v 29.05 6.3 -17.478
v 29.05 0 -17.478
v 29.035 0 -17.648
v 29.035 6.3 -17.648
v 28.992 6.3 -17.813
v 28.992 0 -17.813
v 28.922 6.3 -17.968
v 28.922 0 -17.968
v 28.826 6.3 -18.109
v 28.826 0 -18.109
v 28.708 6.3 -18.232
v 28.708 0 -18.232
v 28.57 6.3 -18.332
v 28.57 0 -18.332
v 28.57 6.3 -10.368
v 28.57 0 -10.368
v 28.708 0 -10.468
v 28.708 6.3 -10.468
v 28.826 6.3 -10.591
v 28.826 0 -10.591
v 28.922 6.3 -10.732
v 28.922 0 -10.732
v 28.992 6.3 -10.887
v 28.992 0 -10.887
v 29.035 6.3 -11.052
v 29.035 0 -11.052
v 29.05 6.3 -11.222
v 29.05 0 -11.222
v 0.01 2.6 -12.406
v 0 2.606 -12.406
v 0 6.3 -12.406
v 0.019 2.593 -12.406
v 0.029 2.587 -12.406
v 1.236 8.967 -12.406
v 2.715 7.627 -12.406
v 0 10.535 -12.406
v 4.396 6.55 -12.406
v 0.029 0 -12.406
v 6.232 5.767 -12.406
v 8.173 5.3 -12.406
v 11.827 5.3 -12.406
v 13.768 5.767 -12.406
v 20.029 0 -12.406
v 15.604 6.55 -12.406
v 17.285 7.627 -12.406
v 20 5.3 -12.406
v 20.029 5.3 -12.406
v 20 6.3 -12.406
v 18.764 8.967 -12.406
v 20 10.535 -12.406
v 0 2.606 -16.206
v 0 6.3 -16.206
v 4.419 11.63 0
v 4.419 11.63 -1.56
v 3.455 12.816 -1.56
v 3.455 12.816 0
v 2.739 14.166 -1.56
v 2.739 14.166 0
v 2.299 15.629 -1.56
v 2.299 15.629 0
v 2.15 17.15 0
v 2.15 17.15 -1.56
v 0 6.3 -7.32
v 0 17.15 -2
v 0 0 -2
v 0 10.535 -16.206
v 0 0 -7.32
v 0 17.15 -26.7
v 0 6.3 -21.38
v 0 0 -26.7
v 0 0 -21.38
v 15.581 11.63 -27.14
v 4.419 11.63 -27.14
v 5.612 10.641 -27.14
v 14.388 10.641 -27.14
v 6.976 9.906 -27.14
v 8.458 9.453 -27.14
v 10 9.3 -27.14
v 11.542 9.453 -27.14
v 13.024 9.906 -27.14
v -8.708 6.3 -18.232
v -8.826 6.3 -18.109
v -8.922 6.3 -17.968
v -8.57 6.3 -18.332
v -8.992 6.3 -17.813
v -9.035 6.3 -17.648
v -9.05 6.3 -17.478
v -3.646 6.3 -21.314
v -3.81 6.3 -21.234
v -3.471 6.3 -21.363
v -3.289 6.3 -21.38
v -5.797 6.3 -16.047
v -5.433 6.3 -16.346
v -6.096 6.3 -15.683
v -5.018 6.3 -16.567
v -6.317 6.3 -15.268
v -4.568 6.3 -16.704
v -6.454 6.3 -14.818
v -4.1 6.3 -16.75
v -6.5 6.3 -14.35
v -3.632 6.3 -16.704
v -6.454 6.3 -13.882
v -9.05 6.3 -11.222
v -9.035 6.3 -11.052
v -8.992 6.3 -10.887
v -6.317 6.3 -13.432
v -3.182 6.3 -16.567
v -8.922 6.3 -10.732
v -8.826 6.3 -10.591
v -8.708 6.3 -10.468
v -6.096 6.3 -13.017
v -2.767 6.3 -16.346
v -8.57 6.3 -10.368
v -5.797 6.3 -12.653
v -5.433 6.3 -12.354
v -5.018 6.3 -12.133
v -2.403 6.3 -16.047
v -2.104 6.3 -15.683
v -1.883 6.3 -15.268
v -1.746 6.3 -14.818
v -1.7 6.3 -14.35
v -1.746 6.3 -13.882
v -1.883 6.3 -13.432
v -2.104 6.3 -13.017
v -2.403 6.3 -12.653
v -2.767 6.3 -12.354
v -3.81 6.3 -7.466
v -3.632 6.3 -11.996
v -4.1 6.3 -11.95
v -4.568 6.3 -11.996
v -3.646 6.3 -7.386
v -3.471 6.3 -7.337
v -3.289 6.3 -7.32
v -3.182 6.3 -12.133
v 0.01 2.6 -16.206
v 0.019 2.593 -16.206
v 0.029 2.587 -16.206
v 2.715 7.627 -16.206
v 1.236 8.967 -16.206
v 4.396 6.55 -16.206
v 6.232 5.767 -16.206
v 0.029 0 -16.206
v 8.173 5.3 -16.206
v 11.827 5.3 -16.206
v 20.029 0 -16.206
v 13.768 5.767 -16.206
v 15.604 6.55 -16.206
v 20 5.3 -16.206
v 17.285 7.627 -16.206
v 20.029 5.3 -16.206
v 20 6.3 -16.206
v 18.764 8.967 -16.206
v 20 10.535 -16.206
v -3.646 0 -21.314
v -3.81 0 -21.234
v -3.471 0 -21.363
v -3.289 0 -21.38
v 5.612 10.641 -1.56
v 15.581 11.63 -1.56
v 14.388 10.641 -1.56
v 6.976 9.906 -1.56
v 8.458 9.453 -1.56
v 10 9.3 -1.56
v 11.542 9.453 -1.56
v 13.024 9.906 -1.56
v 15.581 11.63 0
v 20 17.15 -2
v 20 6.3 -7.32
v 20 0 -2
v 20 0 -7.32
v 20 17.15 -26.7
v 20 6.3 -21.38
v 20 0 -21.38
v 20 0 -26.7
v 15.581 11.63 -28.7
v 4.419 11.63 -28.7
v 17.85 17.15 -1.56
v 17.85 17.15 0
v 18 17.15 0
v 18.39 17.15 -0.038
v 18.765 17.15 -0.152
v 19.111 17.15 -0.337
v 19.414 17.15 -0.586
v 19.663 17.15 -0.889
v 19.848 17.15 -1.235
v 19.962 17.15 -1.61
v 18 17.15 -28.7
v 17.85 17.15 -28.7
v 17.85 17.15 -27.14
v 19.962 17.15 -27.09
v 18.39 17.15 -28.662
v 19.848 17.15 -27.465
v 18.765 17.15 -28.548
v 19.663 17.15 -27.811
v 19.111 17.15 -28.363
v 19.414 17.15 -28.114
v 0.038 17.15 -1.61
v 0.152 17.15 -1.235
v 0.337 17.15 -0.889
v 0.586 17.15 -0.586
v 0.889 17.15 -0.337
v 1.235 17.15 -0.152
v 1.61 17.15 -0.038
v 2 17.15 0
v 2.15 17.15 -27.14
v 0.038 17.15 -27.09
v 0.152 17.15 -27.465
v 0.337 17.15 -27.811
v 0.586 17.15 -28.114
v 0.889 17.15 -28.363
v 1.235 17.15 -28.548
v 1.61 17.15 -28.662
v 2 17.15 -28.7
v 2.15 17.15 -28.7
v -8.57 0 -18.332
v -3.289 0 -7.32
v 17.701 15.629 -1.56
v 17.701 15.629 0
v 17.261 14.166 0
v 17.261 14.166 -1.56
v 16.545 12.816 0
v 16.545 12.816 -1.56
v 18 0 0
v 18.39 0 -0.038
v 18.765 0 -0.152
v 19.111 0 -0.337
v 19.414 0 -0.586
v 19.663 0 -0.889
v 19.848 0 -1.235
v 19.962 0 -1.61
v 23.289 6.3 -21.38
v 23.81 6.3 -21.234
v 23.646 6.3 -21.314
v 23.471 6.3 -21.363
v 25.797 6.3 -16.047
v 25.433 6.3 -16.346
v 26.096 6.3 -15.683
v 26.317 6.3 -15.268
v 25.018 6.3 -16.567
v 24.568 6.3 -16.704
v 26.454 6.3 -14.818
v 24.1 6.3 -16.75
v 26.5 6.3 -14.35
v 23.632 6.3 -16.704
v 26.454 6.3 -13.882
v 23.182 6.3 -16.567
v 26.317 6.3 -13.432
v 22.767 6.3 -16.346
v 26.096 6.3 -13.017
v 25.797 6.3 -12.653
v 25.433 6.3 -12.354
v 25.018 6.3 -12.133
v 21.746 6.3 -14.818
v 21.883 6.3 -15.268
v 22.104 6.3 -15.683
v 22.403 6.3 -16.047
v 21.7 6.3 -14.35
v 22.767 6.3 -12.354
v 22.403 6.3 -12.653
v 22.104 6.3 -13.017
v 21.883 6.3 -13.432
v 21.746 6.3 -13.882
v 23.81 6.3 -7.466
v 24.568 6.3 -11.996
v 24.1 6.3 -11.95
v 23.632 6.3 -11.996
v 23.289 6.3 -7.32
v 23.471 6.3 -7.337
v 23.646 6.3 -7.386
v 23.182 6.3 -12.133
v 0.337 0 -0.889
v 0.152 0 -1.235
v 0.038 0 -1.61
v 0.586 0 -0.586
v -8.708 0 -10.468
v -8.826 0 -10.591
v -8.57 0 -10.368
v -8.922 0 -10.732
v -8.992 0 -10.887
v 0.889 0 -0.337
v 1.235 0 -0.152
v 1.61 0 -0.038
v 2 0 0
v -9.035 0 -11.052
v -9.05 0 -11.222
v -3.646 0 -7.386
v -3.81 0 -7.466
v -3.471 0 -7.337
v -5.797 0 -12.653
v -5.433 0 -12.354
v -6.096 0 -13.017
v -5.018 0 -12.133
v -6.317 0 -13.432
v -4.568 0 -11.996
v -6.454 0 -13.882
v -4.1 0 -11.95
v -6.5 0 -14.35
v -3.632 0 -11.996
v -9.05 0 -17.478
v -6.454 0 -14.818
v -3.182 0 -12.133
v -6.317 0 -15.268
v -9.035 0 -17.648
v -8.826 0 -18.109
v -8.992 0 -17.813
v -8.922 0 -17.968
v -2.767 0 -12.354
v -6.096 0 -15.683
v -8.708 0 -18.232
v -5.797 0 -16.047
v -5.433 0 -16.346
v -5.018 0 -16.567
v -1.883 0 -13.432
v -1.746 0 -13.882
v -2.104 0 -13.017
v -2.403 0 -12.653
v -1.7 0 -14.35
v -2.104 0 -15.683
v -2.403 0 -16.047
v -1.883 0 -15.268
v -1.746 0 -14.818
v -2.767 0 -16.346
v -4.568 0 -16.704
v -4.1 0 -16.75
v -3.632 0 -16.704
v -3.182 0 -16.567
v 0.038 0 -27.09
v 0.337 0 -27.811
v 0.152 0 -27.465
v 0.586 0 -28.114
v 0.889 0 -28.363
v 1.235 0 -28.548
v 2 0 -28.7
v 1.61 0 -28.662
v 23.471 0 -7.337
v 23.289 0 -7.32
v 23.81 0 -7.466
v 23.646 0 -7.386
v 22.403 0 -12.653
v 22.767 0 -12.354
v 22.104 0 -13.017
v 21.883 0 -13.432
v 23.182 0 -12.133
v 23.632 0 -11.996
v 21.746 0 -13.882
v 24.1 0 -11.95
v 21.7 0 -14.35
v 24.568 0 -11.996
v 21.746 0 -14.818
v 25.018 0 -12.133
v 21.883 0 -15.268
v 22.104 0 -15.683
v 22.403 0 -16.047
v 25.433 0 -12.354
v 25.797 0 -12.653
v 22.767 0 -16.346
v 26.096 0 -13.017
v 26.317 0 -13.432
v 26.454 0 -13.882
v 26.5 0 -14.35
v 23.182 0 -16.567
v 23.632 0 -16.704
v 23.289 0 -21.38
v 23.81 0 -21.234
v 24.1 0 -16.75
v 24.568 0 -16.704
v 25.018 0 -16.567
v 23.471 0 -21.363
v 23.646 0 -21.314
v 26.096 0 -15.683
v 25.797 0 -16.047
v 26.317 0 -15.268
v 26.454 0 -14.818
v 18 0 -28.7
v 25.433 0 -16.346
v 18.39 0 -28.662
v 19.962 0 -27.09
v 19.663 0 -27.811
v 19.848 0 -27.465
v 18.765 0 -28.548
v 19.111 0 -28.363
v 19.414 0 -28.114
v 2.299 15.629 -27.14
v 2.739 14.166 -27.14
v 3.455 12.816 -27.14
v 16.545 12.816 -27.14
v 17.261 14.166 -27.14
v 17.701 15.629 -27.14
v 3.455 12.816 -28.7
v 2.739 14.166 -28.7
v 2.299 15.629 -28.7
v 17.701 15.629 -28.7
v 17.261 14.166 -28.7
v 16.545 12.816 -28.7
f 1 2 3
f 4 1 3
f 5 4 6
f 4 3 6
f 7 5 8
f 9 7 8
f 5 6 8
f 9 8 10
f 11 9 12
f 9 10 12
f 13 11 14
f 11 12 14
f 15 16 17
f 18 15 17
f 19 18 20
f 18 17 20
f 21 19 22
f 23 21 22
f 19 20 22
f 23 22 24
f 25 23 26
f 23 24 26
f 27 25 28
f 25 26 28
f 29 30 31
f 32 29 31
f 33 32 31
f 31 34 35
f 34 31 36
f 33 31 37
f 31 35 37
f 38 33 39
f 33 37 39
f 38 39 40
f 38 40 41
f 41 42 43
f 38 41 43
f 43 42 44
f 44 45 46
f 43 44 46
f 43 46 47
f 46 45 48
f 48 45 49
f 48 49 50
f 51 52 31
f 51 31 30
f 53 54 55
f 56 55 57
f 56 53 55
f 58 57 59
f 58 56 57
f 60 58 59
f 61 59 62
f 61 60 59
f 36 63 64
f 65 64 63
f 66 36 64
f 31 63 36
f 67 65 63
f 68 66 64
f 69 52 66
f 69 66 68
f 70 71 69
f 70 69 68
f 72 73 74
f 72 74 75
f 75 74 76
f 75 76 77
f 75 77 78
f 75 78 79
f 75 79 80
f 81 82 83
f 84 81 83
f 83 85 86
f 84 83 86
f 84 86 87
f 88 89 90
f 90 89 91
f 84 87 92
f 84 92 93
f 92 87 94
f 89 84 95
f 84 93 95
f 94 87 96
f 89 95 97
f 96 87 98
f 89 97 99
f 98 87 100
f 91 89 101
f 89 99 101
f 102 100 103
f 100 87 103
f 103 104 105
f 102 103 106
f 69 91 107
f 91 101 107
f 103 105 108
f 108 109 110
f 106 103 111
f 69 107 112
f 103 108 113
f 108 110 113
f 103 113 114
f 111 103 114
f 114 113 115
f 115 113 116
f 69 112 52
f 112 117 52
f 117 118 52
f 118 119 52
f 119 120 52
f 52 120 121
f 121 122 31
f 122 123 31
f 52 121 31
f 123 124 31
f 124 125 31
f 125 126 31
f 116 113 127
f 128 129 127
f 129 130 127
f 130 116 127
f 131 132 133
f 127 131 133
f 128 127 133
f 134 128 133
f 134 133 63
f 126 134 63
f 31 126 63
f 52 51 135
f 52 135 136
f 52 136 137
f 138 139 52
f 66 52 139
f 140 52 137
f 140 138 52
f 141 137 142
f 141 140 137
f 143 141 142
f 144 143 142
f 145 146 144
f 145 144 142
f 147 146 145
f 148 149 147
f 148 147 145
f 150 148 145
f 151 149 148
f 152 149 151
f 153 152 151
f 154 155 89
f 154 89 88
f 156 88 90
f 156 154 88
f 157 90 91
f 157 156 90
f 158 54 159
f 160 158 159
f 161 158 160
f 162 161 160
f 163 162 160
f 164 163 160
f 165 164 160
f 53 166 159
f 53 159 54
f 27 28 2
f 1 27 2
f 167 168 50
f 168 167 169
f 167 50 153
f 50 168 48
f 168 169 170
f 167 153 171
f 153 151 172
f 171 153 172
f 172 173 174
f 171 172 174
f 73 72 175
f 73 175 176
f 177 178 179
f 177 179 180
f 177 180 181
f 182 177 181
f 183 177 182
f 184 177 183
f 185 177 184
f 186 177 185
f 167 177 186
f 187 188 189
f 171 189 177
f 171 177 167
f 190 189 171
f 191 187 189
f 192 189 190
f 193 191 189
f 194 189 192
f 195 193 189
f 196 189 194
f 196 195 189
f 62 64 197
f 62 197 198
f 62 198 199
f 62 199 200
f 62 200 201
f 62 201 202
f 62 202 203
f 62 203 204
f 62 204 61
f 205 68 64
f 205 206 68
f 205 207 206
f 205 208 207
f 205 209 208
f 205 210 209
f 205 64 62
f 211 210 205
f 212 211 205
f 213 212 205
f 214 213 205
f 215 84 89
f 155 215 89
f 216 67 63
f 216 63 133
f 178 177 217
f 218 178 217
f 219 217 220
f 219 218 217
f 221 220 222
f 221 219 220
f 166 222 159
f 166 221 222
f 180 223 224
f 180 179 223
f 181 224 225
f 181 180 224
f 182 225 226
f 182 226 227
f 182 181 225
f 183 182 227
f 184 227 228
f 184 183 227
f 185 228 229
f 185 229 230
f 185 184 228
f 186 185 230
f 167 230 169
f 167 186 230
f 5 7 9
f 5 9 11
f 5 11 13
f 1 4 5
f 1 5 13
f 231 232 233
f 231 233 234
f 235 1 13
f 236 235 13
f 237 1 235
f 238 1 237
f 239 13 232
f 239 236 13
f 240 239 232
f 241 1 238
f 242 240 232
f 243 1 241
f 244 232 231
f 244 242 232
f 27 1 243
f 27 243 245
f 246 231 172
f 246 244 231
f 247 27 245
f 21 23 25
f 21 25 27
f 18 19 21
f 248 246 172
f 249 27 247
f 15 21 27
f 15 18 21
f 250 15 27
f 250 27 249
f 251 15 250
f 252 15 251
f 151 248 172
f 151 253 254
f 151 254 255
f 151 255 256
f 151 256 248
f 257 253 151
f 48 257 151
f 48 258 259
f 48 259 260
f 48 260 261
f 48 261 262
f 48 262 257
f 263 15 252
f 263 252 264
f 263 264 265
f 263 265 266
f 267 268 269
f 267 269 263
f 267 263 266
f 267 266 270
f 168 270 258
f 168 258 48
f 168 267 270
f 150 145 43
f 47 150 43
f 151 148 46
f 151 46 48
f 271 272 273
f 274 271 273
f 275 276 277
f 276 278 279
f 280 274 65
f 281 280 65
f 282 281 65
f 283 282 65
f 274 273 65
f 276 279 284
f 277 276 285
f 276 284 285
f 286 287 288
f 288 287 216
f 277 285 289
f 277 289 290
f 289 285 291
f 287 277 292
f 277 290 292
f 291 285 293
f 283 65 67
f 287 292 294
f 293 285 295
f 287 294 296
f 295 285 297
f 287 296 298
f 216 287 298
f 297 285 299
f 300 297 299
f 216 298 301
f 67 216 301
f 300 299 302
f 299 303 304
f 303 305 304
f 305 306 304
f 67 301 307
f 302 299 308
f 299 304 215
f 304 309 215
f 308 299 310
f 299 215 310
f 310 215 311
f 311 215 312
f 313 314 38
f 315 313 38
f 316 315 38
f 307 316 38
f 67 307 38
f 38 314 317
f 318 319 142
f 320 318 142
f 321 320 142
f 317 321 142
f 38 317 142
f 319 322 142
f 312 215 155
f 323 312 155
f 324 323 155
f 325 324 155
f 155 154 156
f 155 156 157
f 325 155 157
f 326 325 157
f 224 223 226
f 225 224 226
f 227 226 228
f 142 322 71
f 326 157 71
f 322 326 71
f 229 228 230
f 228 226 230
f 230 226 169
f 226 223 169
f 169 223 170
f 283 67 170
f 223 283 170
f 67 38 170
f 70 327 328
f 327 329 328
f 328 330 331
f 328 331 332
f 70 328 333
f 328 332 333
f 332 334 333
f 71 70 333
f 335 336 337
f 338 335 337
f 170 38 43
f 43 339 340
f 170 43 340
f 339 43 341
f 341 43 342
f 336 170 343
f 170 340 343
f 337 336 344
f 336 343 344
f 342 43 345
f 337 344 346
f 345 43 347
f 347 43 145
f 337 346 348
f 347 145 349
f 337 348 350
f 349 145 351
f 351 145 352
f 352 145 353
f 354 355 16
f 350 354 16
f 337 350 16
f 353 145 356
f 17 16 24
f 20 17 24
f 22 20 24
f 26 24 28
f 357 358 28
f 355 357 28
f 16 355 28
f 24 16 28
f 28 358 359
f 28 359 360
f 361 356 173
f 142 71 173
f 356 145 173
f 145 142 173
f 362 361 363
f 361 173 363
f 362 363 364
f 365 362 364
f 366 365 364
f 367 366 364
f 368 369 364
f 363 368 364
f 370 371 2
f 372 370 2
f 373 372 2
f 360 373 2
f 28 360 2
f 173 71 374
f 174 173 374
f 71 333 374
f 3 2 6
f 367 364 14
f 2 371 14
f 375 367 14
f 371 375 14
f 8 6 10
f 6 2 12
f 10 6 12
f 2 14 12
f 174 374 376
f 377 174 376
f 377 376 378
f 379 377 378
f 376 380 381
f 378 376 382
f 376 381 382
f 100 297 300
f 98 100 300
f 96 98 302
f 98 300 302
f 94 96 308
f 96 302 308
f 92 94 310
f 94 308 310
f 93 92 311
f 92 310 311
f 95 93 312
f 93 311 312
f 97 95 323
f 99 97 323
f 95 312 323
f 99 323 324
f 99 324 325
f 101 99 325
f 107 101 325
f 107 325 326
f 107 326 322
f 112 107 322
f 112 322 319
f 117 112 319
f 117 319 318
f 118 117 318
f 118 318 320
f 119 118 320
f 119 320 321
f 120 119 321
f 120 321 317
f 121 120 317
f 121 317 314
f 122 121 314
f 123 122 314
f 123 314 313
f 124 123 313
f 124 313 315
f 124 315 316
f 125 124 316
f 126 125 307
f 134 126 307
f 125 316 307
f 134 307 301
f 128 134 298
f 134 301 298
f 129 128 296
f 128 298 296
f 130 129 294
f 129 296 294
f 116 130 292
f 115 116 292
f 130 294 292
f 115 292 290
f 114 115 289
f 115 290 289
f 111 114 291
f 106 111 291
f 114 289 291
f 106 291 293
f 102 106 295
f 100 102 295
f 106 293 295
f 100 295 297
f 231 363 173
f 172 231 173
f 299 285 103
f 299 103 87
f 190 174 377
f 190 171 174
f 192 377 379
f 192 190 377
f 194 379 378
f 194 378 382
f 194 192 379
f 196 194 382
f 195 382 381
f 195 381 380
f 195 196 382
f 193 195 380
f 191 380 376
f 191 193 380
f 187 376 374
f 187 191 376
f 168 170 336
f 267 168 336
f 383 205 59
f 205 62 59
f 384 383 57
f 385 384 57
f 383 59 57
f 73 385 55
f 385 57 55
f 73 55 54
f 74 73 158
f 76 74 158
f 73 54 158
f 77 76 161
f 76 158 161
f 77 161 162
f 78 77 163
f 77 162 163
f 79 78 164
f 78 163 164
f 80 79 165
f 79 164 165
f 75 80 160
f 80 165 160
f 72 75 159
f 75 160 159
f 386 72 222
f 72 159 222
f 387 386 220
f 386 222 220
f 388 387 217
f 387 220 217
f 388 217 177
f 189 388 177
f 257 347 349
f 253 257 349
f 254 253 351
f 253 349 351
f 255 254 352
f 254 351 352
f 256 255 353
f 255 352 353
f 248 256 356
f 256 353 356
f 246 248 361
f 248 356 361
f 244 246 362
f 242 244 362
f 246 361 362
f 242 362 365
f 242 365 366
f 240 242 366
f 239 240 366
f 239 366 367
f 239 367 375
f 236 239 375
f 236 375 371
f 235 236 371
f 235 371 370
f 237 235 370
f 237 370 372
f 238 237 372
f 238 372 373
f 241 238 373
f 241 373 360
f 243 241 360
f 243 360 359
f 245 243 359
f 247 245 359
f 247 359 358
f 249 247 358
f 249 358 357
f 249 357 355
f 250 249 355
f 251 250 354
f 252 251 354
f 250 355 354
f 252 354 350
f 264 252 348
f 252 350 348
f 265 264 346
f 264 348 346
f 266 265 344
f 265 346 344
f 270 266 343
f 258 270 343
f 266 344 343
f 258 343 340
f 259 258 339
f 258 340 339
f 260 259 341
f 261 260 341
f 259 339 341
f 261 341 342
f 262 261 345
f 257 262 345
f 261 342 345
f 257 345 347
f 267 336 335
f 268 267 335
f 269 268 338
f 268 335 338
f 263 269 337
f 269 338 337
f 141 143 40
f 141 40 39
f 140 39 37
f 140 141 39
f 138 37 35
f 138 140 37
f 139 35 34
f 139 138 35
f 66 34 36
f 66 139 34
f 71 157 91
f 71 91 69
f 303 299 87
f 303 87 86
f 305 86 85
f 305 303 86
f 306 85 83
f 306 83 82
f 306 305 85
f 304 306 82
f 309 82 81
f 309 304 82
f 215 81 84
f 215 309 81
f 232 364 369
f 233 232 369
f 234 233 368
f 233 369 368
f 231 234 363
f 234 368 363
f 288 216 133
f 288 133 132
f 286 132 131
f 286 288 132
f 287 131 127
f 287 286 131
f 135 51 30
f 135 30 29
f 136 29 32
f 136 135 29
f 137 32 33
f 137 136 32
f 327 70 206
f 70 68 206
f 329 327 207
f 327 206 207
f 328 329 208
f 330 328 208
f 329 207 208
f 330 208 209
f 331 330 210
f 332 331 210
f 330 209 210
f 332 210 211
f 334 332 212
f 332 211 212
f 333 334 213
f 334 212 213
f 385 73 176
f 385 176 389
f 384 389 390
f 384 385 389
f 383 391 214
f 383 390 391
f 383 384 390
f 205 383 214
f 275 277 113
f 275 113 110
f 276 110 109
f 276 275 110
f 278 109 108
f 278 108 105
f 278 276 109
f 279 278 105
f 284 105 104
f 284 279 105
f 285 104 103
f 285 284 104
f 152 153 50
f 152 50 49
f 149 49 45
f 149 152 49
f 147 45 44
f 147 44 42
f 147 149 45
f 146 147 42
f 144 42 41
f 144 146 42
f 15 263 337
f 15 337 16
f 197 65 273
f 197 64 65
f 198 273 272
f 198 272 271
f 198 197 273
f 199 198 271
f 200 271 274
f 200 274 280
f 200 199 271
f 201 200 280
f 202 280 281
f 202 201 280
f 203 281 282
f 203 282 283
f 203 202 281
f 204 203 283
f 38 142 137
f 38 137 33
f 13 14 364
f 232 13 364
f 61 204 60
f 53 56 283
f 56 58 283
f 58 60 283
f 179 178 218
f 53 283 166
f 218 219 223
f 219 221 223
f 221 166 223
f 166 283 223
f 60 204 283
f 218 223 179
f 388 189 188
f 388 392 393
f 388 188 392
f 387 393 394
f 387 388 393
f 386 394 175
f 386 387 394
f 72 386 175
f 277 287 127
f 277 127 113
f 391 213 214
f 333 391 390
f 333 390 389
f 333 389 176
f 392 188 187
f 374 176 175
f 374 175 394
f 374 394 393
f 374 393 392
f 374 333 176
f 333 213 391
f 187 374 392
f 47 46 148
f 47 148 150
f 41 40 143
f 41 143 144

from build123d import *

# Parameters (mm, degrees)
SKETCH1_W            = 20
SKETCH1_H            = 28.7
BOSS_EXTRUDE1_DEPTH  = 17.15
CUT_EXTRUDE1_START   = -1.56
SKETCH2_R            = 7.85
CUT_EXTRUDE1_DEPTH   = 25.58
CUT_EXTRUDE2_DEPTH   = 39.959113
BOSS_EXTRUDE2_DEPTH  = 6.3
M4_CLEARANCE_HOLE1_D = 4.8
CUT_REVOLVE3_START   = -16.206498
CUT_REVOLVE3_DEPTH   = 3.8
CUT_REVOLVE4_START   = -16.206498
CUT_REVOLVE4_DEPTH   = 3.8
SKETCH10_W           = 20
SKETCH10_H           = 3.8
CUT_EXTRUDE3_DEPTH   = 5.3
FILLET1_R            = 2


# Read off the part's stored shape, not the designer's step: Cut-Revolve3, Cut-Revolve4
with BuildPart() as part:
    # Sketch1 → Boss-Extrude1 (new body)
    with BuildSketch(Plane(origin=(0, 0, 0), x_dir=(1, 0, 0), z_dir=(0, 1, 0))):
        with Locations((10, 14.35)):
            Rectangle(SKETCH1_W, SKETCH1_H)
    extrude(amount=BOSS_EXTRUDE1_DEPTH)

    # Sketch2 → Cut-Extrude1 (cut)
    with BuildSketch(Plane.XY.offset(CUT_EXTRUDE1_START)):
        with Locations((10, 17.15)):
            Circle(SKETCH2_R)
    extrude(amount=-CUT_EXTRUDE1_DEPTH, mode=Mode.SUBTRACT)

    # Sketch3 → Cut-Extrude2 (cut, through all)
    with BuildSketch(Plane.XY):
        with BuildLine():
            Line((2.15, 17.15), (17.85, 17.15))
            ThreePointArc((17.85, 17.15), (17.260735, 14.166005), (15.581407, 11.63))
            Line((15.581407, 11.63), (14.85, 11.63))
            Line((14.85, 11.63), (5.15, 11.63))
            Line((5.15, 11.63), (4.418593, 11.63))
            ThreePointArc((4.418593, 11.63), (2.739265, 14.166005), (2.15, 17.15))
        make_face()
    extrude(amount=-CUT_EXTRUDE2_DEPTH, mode=Mode.SUBTRACT)

    # Sketch4 → Boss-Extrude2 (add)
    with BuildSketch(Plane.XZ):
        with BuildLine():
            Line((20, -7.32), (23.289272, -7.32))
            ThreePointArc((23.289272, -7.32), (23.559552, -7.357218), (23.809713, -7.466102))
            Line((23.809713, -7.466102), (28.570441, -10.367714))
            ThreePointArc((28.570441, -10.367714), (28.921906, -10.731939), (29.05, -11.221612))
            Line((29.05, -11.221612), (29.05, -17.478388))
            ThreePointArc((29.05, -17.478388), (28.921906, -17.968061), (28.570441, -18.332286))
            Line((28.570441, -18.332286), (23.809713, -21.233898))
            ThreePointArc((23.809713, -21.233898), (23.559552, -21.342782), (23.289272, -21.38))
            Line((23.289272, -21.38), (20, -21.38))
            Line((20, -21.38), (20, -7.32))
        make_face()
    boss_extrude2 = extrude(amount=-BOSS_EXTRUDE2_DEPTH)

    # Mirror1: Boss-Extrude2 across plane
    add(boss_extrude2.mirror(Plane(origin=(10, 0, 0), x_dir=(0, 0, 1), z_dir=(1, 0, 0))))

    # M4 Clearance Hole1 (through all)
    with Locations(Plane(origin=(0, 6.3, 0), x_dir=(1, 0, 0), z_dir=(0, 1, 0))):
        with Locations((24.1, 14.35), (-4.1, 14.35)):
            Hole(M4_CLEARANCE_HOLE1_D / 2)

    # Cut-Revolve3 outline → Cut-Revolve3 (cut)
    with BuildSketch(Plane.XY.offset(CUT_REVOLVE3_START)):
        with BuildLine():
            Line((0, 10.534858), (0, 2.606187))
            ThreePointArc((0, 2.606187), (2.795508, 1.037341), (5.828669, 0))
            Line((5.828669, 0), (10, 0))
            Line((10, 0), (10, 5.16))
            ThreePointArc((10, 5.16), (4.323533, 6.588853), (0, 10.534858))
        make_face()
    extrude(amount=CUT_REVOLVE3_DEPTH, mode=Mode.SUBTRACT)

    # Cut-Revolve4 outline → Cut-Revolve4 (cut)
    with BuildSketch(Plane.XY.offset(CUT_REVOLVE4_START)):
        with BuildLine():
            ThreePointArc((20, 10.534858), (15.676467, 6.588853), (10, 5.16))
            Line((10, 5.16), (10, 0))
            Line((10, 0), (14.171331, 0))
            ThreePointArc((14.171331, 0), (17.204492, 1.037341), (20, 2.606187))
            Line((20, 2.606187), (20, 10.534858))
        make_face()
    extrude(amount=CUT_REVOLVE4_DEPTH, mode=Mode.SUBTRACT)

    # Sketch10 → Cut-Extrude3 (cut)
    with BuildSketch(Plane.XZ):
        with Locations((10.028669, -14.306498)):
            Rectangle(SKETCH10_W, SKETCH10_H)
    extrude(amount=-CUT_EXTRUDE3_DEPTH, mode=Mode.SUBTRACT)

    # Fillet1
    fillet1_edges = [part.edges().sort_by_distance(p)[0] for p in [
        (0, 8.575, -28.7),
        (20, 8.575, -28.7),
        (20, 8.575, 0),
        (0, 8.575, 0),
    ]]
    fillet(fillet1_edges, radius=FILLET1_R)


solid = part.part
